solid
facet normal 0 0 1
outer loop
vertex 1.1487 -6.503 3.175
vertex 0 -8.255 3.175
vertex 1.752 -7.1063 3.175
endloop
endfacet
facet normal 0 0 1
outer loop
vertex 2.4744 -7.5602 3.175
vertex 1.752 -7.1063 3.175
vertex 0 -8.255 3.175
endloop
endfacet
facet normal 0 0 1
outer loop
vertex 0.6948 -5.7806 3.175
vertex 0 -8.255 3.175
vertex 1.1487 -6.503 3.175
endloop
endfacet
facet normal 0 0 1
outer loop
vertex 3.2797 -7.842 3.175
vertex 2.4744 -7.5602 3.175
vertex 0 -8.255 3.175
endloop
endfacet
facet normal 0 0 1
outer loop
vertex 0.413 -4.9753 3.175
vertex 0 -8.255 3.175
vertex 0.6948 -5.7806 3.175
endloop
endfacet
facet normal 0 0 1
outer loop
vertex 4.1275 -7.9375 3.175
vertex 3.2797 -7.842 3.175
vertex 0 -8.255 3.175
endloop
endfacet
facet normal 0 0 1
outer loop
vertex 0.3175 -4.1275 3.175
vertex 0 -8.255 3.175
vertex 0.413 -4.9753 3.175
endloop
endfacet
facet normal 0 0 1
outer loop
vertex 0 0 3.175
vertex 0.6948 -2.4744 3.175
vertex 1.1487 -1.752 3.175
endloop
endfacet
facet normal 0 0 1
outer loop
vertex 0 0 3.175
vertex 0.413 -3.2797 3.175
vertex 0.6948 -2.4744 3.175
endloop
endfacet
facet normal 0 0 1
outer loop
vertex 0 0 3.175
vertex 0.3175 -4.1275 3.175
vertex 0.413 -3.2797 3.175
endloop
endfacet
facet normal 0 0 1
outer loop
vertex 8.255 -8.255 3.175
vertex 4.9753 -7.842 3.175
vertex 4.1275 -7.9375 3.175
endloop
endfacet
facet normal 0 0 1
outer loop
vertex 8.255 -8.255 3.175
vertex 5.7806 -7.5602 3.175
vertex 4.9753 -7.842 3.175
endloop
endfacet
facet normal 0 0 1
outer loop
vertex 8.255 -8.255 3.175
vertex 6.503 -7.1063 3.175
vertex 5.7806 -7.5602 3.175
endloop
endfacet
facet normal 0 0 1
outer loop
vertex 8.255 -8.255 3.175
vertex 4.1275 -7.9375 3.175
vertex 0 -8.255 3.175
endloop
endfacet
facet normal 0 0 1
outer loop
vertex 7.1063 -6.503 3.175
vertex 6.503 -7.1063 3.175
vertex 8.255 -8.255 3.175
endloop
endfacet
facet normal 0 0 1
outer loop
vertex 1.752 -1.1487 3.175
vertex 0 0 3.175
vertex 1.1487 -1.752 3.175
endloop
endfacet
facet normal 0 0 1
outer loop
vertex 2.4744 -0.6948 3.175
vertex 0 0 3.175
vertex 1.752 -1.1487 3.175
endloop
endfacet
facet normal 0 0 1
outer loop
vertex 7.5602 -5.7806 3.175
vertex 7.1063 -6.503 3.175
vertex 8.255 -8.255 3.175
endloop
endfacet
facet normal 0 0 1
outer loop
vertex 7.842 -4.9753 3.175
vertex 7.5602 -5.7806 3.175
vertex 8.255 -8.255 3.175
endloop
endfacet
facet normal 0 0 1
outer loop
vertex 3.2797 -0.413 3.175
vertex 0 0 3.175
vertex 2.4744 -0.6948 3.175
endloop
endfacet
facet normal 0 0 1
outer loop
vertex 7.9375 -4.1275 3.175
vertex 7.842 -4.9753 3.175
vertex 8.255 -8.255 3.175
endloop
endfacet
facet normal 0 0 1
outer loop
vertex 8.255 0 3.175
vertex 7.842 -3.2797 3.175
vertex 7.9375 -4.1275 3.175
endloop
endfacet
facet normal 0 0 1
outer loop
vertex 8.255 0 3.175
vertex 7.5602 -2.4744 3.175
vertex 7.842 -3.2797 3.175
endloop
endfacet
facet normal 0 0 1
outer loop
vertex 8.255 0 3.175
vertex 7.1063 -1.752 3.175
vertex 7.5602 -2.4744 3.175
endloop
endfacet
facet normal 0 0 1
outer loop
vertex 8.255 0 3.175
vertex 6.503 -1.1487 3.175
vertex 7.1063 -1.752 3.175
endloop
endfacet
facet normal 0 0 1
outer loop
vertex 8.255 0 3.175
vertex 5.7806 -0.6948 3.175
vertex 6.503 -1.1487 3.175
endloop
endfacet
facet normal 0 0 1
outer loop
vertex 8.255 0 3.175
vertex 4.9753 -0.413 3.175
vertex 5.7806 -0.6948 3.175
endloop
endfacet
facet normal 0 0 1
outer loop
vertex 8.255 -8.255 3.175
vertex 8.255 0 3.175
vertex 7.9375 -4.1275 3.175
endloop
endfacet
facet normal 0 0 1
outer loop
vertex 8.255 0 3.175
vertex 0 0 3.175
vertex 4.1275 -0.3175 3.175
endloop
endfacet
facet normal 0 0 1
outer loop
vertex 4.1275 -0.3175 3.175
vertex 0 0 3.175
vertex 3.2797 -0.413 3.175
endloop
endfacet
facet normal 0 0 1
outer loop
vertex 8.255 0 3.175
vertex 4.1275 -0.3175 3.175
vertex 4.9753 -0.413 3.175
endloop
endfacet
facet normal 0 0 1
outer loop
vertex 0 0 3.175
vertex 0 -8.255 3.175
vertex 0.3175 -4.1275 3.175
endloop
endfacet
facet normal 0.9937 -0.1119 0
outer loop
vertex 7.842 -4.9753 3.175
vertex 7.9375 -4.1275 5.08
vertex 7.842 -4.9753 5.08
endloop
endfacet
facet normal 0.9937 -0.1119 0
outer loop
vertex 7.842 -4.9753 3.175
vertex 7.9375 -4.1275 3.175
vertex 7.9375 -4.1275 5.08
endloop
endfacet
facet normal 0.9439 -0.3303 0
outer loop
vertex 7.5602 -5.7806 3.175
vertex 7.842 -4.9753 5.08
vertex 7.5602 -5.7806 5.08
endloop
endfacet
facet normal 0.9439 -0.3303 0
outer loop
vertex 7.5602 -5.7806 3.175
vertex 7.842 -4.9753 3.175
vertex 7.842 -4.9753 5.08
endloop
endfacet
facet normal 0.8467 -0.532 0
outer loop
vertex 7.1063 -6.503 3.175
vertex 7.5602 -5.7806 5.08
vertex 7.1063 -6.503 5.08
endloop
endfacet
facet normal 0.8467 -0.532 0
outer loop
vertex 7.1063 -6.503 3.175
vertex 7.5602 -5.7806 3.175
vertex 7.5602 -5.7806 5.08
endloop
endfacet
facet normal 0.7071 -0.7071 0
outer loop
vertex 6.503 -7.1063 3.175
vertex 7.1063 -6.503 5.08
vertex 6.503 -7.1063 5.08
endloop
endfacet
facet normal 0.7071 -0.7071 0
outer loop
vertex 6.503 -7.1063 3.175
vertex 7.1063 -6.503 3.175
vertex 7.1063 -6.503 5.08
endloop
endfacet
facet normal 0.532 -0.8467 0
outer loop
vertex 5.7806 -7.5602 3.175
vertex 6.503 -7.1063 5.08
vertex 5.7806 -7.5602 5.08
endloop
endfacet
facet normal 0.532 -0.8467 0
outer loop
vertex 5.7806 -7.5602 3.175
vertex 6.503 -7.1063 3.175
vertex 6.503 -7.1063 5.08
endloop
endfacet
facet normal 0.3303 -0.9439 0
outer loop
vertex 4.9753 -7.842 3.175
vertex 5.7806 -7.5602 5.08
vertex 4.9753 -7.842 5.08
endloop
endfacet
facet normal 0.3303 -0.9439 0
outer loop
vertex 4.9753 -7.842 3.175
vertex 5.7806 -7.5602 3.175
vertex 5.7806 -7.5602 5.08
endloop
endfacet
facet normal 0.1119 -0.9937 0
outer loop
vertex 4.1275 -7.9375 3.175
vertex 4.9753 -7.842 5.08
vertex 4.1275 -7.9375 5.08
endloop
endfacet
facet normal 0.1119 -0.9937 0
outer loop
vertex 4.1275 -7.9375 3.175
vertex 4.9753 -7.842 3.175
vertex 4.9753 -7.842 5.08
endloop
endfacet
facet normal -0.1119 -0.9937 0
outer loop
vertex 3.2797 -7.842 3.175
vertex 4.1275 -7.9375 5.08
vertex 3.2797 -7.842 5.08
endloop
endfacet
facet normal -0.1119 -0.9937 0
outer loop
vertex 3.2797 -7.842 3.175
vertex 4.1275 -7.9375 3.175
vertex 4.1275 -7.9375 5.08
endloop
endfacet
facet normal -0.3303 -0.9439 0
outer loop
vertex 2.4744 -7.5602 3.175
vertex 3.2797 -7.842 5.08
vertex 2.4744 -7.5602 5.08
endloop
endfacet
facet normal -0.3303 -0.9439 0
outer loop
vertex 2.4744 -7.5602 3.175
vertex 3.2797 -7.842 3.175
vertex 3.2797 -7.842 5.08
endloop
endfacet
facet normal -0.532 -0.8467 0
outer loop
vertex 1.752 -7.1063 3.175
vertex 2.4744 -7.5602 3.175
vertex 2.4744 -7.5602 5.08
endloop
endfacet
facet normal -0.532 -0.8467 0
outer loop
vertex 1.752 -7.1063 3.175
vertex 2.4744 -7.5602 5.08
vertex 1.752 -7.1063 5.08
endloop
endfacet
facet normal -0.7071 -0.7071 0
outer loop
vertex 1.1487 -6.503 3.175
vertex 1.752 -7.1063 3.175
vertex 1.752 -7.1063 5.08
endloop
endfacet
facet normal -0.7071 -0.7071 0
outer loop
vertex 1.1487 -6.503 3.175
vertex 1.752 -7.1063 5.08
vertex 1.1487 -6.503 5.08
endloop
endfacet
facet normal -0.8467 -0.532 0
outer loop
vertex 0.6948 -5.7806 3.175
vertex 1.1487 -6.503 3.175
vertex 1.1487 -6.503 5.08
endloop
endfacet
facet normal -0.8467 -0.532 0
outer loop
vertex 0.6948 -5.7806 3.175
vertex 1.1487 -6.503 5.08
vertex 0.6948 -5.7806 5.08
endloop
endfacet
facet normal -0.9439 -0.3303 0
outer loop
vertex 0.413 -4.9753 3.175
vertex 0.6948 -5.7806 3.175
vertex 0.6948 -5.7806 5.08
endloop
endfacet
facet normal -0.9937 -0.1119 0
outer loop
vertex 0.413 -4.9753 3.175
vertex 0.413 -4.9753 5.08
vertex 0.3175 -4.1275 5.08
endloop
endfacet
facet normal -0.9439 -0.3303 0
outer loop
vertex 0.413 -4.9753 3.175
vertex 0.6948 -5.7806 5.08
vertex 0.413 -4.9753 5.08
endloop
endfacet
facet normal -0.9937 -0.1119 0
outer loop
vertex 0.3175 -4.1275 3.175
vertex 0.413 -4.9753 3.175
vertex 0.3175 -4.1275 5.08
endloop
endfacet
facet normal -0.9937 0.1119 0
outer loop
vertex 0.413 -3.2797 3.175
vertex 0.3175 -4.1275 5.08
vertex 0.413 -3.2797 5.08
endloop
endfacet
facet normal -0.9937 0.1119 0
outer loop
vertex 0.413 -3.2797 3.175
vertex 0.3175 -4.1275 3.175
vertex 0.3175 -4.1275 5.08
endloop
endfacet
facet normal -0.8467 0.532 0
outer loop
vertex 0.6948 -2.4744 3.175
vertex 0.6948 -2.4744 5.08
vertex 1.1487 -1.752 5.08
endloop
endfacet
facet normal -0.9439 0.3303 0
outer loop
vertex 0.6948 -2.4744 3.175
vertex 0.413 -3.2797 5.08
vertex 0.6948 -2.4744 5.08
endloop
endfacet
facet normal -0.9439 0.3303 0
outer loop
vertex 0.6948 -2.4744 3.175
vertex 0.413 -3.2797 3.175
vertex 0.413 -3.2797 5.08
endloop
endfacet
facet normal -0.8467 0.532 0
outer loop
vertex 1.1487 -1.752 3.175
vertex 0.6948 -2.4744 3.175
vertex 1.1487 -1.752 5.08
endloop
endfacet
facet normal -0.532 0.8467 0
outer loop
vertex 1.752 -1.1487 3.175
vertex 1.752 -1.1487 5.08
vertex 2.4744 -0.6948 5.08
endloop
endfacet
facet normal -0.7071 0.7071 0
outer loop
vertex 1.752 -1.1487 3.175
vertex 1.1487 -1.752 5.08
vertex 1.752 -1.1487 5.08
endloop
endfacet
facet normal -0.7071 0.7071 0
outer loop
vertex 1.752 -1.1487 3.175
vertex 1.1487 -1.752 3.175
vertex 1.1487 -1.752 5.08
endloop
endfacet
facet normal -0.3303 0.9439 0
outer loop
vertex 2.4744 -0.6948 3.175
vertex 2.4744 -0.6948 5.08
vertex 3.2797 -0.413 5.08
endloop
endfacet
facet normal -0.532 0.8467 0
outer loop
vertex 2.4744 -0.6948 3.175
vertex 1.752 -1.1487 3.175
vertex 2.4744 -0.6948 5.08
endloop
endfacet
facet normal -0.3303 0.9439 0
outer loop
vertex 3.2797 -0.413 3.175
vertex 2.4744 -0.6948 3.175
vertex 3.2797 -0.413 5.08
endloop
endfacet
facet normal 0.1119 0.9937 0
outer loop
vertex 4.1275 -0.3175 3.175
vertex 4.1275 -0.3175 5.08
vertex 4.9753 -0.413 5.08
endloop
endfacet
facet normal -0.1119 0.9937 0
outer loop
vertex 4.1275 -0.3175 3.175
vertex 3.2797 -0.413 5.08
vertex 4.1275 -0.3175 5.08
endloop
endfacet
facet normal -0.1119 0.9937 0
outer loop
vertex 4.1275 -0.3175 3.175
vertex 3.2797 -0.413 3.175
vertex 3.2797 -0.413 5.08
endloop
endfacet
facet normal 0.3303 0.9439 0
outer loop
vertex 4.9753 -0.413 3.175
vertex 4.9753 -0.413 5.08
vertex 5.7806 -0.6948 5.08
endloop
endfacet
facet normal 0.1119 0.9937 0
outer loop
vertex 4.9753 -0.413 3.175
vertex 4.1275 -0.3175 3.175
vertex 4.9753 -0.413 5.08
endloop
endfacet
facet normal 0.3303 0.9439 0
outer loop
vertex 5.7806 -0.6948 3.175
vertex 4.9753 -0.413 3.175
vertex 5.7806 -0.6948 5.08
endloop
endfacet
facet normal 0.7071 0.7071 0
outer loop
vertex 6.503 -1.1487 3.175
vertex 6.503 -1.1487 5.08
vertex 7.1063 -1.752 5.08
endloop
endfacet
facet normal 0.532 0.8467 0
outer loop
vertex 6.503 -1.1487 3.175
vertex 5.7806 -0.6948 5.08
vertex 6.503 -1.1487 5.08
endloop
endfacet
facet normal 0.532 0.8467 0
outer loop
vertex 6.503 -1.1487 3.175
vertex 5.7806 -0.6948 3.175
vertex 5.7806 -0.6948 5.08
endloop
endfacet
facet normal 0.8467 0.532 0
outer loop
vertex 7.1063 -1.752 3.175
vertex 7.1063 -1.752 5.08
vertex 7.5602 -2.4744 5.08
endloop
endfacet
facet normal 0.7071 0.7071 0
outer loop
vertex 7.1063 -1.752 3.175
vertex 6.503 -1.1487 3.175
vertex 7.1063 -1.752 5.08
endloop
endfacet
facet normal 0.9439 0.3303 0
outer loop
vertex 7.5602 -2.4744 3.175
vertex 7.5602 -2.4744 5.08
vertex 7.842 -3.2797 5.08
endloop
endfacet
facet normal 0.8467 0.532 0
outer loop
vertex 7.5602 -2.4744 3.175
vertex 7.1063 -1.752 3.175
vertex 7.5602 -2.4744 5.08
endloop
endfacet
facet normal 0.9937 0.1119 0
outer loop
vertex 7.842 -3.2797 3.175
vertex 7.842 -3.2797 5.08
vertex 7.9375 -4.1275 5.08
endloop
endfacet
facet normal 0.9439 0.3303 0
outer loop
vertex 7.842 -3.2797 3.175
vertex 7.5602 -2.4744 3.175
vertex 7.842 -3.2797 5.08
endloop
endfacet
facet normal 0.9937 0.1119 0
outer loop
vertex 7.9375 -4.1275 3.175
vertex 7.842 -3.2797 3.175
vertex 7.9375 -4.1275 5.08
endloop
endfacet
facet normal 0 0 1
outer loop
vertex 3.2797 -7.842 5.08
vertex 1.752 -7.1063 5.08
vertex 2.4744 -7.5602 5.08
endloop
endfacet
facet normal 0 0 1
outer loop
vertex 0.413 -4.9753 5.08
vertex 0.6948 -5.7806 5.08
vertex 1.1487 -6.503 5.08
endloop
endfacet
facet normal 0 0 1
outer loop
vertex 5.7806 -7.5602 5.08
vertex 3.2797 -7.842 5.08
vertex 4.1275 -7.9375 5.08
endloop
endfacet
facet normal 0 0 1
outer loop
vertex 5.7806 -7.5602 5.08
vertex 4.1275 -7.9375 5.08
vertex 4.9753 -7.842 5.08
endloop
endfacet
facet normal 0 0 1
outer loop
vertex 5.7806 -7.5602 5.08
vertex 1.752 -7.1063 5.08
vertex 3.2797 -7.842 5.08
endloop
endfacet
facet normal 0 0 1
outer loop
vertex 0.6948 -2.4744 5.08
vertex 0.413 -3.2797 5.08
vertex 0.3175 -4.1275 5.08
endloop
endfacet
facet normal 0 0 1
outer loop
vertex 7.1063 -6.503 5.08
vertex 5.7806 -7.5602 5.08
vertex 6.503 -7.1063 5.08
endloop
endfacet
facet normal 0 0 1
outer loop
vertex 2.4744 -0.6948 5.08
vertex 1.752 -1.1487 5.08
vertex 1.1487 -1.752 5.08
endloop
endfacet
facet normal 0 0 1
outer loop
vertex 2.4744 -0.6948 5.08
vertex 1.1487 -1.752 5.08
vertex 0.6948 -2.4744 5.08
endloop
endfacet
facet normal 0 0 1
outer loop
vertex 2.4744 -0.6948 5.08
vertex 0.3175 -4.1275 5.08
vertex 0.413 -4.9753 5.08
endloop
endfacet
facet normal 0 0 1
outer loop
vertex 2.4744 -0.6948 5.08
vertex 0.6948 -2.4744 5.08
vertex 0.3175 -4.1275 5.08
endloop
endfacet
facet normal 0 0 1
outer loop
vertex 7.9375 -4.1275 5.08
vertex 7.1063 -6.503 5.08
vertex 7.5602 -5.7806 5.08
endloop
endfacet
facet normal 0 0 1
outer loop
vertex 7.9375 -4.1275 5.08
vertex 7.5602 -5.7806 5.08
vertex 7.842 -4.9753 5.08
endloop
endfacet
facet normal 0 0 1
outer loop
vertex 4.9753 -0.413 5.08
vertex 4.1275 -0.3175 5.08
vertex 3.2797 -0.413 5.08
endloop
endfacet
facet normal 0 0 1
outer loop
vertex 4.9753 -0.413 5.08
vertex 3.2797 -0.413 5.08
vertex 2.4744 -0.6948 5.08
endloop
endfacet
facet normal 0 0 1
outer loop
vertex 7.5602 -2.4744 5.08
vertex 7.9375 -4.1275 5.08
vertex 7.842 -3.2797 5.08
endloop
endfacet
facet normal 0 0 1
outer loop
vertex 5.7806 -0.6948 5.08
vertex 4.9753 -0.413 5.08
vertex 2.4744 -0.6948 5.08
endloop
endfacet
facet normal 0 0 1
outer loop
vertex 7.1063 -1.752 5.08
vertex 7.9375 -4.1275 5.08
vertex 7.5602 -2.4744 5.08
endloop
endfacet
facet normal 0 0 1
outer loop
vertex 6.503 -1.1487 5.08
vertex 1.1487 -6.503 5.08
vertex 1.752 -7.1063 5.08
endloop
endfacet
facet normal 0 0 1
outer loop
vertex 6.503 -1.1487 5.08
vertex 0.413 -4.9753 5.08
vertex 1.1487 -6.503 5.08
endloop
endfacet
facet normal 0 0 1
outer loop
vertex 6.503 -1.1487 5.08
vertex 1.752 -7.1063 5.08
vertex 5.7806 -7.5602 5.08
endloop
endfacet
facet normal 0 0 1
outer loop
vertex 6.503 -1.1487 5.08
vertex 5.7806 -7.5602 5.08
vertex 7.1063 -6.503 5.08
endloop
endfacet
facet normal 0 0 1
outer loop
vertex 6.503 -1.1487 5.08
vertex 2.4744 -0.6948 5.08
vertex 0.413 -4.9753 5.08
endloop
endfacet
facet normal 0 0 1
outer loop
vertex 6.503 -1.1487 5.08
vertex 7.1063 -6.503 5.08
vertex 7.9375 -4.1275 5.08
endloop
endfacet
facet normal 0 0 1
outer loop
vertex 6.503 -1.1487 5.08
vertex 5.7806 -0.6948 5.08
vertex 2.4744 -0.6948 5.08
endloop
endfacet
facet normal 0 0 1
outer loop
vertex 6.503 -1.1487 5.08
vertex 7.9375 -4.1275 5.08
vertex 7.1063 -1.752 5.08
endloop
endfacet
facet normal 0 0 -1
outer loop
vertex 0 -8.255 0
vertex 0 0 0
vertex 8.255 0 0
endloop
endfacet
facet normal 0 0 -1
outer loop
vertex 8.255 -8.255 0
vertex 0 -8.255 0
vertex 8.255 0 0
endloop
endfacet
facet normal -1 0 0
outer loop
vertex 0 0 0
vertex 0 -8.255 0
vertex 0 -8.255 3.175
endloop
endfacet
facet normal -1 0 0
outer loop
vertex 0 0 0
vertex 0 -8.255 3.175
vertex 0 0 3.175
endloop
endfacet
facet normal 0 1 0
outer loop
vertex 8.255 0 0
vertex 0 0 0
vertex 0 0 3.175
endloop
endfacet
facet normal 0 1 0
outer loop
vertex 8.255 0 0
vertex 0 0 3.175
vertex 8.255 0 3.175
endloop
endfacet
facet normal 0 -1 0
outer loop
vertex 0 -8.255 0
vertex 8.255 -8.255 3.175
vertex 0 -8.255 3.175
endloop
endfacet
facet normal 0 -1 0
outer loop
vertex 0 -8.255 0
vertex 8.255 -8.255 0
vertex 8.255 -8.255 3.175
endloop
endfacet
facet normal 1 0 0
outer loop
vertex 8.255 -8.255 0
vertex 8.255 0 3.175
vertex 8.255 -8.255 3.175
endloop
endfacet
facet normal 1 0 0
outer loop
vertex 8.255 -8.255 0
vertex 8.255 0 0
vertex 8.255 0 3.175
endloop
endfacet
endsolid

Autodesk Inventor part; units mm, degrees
ref_plane "YZ Plane" through (0, 0, 0) normal (1, 0, 0) x (0, 1, 0)
ref_plane "XZ Plane" through (0, 0, 0) normal (0, 1, 0) x (-1, 0, 0)
ref_plane "XY Plane" through (0, 0, 0) normal (0, 0, 1) x (1, 0, 0)
sketch "Sketch1" plane through (0, 0, 0) normal (0, 0, 1) x (1, 0, 0)
  line L0 (0, 0) -> (8.255, 0)
  line L1 (8.255, 0) -> (8.255, -8.255)
  line L2 (8.255, -8.255) -> (0, -8.255)
  line L3 (0, -8.255) -> (0, 0)
  dimension "d0" = 8.255
  dimension "d1" = 8.255
extrude "Extrusion1" add sketch "Sketch1" along normal blind 3.175
sketch "Sketch2" plane through (0, 0, 3.175) normal (0, 0, 1) x (1, 0, 0)
  circle A0 centre (4.1275, -4.1275) radius 3.81
  line L0 (0, 0) -> (0, -8.255) projected
  line L1 (8.255, 0) -> (0, 0) projected
  dimension "d4" = 7.62
  dimension "d5" = 4.1275
  dimension "d6" = 4.1275
extrude "Extrusion2" add sketch "Sketch2" along normal blind 1.905
properties part number "CameraLens" material "ABS Plastic"
